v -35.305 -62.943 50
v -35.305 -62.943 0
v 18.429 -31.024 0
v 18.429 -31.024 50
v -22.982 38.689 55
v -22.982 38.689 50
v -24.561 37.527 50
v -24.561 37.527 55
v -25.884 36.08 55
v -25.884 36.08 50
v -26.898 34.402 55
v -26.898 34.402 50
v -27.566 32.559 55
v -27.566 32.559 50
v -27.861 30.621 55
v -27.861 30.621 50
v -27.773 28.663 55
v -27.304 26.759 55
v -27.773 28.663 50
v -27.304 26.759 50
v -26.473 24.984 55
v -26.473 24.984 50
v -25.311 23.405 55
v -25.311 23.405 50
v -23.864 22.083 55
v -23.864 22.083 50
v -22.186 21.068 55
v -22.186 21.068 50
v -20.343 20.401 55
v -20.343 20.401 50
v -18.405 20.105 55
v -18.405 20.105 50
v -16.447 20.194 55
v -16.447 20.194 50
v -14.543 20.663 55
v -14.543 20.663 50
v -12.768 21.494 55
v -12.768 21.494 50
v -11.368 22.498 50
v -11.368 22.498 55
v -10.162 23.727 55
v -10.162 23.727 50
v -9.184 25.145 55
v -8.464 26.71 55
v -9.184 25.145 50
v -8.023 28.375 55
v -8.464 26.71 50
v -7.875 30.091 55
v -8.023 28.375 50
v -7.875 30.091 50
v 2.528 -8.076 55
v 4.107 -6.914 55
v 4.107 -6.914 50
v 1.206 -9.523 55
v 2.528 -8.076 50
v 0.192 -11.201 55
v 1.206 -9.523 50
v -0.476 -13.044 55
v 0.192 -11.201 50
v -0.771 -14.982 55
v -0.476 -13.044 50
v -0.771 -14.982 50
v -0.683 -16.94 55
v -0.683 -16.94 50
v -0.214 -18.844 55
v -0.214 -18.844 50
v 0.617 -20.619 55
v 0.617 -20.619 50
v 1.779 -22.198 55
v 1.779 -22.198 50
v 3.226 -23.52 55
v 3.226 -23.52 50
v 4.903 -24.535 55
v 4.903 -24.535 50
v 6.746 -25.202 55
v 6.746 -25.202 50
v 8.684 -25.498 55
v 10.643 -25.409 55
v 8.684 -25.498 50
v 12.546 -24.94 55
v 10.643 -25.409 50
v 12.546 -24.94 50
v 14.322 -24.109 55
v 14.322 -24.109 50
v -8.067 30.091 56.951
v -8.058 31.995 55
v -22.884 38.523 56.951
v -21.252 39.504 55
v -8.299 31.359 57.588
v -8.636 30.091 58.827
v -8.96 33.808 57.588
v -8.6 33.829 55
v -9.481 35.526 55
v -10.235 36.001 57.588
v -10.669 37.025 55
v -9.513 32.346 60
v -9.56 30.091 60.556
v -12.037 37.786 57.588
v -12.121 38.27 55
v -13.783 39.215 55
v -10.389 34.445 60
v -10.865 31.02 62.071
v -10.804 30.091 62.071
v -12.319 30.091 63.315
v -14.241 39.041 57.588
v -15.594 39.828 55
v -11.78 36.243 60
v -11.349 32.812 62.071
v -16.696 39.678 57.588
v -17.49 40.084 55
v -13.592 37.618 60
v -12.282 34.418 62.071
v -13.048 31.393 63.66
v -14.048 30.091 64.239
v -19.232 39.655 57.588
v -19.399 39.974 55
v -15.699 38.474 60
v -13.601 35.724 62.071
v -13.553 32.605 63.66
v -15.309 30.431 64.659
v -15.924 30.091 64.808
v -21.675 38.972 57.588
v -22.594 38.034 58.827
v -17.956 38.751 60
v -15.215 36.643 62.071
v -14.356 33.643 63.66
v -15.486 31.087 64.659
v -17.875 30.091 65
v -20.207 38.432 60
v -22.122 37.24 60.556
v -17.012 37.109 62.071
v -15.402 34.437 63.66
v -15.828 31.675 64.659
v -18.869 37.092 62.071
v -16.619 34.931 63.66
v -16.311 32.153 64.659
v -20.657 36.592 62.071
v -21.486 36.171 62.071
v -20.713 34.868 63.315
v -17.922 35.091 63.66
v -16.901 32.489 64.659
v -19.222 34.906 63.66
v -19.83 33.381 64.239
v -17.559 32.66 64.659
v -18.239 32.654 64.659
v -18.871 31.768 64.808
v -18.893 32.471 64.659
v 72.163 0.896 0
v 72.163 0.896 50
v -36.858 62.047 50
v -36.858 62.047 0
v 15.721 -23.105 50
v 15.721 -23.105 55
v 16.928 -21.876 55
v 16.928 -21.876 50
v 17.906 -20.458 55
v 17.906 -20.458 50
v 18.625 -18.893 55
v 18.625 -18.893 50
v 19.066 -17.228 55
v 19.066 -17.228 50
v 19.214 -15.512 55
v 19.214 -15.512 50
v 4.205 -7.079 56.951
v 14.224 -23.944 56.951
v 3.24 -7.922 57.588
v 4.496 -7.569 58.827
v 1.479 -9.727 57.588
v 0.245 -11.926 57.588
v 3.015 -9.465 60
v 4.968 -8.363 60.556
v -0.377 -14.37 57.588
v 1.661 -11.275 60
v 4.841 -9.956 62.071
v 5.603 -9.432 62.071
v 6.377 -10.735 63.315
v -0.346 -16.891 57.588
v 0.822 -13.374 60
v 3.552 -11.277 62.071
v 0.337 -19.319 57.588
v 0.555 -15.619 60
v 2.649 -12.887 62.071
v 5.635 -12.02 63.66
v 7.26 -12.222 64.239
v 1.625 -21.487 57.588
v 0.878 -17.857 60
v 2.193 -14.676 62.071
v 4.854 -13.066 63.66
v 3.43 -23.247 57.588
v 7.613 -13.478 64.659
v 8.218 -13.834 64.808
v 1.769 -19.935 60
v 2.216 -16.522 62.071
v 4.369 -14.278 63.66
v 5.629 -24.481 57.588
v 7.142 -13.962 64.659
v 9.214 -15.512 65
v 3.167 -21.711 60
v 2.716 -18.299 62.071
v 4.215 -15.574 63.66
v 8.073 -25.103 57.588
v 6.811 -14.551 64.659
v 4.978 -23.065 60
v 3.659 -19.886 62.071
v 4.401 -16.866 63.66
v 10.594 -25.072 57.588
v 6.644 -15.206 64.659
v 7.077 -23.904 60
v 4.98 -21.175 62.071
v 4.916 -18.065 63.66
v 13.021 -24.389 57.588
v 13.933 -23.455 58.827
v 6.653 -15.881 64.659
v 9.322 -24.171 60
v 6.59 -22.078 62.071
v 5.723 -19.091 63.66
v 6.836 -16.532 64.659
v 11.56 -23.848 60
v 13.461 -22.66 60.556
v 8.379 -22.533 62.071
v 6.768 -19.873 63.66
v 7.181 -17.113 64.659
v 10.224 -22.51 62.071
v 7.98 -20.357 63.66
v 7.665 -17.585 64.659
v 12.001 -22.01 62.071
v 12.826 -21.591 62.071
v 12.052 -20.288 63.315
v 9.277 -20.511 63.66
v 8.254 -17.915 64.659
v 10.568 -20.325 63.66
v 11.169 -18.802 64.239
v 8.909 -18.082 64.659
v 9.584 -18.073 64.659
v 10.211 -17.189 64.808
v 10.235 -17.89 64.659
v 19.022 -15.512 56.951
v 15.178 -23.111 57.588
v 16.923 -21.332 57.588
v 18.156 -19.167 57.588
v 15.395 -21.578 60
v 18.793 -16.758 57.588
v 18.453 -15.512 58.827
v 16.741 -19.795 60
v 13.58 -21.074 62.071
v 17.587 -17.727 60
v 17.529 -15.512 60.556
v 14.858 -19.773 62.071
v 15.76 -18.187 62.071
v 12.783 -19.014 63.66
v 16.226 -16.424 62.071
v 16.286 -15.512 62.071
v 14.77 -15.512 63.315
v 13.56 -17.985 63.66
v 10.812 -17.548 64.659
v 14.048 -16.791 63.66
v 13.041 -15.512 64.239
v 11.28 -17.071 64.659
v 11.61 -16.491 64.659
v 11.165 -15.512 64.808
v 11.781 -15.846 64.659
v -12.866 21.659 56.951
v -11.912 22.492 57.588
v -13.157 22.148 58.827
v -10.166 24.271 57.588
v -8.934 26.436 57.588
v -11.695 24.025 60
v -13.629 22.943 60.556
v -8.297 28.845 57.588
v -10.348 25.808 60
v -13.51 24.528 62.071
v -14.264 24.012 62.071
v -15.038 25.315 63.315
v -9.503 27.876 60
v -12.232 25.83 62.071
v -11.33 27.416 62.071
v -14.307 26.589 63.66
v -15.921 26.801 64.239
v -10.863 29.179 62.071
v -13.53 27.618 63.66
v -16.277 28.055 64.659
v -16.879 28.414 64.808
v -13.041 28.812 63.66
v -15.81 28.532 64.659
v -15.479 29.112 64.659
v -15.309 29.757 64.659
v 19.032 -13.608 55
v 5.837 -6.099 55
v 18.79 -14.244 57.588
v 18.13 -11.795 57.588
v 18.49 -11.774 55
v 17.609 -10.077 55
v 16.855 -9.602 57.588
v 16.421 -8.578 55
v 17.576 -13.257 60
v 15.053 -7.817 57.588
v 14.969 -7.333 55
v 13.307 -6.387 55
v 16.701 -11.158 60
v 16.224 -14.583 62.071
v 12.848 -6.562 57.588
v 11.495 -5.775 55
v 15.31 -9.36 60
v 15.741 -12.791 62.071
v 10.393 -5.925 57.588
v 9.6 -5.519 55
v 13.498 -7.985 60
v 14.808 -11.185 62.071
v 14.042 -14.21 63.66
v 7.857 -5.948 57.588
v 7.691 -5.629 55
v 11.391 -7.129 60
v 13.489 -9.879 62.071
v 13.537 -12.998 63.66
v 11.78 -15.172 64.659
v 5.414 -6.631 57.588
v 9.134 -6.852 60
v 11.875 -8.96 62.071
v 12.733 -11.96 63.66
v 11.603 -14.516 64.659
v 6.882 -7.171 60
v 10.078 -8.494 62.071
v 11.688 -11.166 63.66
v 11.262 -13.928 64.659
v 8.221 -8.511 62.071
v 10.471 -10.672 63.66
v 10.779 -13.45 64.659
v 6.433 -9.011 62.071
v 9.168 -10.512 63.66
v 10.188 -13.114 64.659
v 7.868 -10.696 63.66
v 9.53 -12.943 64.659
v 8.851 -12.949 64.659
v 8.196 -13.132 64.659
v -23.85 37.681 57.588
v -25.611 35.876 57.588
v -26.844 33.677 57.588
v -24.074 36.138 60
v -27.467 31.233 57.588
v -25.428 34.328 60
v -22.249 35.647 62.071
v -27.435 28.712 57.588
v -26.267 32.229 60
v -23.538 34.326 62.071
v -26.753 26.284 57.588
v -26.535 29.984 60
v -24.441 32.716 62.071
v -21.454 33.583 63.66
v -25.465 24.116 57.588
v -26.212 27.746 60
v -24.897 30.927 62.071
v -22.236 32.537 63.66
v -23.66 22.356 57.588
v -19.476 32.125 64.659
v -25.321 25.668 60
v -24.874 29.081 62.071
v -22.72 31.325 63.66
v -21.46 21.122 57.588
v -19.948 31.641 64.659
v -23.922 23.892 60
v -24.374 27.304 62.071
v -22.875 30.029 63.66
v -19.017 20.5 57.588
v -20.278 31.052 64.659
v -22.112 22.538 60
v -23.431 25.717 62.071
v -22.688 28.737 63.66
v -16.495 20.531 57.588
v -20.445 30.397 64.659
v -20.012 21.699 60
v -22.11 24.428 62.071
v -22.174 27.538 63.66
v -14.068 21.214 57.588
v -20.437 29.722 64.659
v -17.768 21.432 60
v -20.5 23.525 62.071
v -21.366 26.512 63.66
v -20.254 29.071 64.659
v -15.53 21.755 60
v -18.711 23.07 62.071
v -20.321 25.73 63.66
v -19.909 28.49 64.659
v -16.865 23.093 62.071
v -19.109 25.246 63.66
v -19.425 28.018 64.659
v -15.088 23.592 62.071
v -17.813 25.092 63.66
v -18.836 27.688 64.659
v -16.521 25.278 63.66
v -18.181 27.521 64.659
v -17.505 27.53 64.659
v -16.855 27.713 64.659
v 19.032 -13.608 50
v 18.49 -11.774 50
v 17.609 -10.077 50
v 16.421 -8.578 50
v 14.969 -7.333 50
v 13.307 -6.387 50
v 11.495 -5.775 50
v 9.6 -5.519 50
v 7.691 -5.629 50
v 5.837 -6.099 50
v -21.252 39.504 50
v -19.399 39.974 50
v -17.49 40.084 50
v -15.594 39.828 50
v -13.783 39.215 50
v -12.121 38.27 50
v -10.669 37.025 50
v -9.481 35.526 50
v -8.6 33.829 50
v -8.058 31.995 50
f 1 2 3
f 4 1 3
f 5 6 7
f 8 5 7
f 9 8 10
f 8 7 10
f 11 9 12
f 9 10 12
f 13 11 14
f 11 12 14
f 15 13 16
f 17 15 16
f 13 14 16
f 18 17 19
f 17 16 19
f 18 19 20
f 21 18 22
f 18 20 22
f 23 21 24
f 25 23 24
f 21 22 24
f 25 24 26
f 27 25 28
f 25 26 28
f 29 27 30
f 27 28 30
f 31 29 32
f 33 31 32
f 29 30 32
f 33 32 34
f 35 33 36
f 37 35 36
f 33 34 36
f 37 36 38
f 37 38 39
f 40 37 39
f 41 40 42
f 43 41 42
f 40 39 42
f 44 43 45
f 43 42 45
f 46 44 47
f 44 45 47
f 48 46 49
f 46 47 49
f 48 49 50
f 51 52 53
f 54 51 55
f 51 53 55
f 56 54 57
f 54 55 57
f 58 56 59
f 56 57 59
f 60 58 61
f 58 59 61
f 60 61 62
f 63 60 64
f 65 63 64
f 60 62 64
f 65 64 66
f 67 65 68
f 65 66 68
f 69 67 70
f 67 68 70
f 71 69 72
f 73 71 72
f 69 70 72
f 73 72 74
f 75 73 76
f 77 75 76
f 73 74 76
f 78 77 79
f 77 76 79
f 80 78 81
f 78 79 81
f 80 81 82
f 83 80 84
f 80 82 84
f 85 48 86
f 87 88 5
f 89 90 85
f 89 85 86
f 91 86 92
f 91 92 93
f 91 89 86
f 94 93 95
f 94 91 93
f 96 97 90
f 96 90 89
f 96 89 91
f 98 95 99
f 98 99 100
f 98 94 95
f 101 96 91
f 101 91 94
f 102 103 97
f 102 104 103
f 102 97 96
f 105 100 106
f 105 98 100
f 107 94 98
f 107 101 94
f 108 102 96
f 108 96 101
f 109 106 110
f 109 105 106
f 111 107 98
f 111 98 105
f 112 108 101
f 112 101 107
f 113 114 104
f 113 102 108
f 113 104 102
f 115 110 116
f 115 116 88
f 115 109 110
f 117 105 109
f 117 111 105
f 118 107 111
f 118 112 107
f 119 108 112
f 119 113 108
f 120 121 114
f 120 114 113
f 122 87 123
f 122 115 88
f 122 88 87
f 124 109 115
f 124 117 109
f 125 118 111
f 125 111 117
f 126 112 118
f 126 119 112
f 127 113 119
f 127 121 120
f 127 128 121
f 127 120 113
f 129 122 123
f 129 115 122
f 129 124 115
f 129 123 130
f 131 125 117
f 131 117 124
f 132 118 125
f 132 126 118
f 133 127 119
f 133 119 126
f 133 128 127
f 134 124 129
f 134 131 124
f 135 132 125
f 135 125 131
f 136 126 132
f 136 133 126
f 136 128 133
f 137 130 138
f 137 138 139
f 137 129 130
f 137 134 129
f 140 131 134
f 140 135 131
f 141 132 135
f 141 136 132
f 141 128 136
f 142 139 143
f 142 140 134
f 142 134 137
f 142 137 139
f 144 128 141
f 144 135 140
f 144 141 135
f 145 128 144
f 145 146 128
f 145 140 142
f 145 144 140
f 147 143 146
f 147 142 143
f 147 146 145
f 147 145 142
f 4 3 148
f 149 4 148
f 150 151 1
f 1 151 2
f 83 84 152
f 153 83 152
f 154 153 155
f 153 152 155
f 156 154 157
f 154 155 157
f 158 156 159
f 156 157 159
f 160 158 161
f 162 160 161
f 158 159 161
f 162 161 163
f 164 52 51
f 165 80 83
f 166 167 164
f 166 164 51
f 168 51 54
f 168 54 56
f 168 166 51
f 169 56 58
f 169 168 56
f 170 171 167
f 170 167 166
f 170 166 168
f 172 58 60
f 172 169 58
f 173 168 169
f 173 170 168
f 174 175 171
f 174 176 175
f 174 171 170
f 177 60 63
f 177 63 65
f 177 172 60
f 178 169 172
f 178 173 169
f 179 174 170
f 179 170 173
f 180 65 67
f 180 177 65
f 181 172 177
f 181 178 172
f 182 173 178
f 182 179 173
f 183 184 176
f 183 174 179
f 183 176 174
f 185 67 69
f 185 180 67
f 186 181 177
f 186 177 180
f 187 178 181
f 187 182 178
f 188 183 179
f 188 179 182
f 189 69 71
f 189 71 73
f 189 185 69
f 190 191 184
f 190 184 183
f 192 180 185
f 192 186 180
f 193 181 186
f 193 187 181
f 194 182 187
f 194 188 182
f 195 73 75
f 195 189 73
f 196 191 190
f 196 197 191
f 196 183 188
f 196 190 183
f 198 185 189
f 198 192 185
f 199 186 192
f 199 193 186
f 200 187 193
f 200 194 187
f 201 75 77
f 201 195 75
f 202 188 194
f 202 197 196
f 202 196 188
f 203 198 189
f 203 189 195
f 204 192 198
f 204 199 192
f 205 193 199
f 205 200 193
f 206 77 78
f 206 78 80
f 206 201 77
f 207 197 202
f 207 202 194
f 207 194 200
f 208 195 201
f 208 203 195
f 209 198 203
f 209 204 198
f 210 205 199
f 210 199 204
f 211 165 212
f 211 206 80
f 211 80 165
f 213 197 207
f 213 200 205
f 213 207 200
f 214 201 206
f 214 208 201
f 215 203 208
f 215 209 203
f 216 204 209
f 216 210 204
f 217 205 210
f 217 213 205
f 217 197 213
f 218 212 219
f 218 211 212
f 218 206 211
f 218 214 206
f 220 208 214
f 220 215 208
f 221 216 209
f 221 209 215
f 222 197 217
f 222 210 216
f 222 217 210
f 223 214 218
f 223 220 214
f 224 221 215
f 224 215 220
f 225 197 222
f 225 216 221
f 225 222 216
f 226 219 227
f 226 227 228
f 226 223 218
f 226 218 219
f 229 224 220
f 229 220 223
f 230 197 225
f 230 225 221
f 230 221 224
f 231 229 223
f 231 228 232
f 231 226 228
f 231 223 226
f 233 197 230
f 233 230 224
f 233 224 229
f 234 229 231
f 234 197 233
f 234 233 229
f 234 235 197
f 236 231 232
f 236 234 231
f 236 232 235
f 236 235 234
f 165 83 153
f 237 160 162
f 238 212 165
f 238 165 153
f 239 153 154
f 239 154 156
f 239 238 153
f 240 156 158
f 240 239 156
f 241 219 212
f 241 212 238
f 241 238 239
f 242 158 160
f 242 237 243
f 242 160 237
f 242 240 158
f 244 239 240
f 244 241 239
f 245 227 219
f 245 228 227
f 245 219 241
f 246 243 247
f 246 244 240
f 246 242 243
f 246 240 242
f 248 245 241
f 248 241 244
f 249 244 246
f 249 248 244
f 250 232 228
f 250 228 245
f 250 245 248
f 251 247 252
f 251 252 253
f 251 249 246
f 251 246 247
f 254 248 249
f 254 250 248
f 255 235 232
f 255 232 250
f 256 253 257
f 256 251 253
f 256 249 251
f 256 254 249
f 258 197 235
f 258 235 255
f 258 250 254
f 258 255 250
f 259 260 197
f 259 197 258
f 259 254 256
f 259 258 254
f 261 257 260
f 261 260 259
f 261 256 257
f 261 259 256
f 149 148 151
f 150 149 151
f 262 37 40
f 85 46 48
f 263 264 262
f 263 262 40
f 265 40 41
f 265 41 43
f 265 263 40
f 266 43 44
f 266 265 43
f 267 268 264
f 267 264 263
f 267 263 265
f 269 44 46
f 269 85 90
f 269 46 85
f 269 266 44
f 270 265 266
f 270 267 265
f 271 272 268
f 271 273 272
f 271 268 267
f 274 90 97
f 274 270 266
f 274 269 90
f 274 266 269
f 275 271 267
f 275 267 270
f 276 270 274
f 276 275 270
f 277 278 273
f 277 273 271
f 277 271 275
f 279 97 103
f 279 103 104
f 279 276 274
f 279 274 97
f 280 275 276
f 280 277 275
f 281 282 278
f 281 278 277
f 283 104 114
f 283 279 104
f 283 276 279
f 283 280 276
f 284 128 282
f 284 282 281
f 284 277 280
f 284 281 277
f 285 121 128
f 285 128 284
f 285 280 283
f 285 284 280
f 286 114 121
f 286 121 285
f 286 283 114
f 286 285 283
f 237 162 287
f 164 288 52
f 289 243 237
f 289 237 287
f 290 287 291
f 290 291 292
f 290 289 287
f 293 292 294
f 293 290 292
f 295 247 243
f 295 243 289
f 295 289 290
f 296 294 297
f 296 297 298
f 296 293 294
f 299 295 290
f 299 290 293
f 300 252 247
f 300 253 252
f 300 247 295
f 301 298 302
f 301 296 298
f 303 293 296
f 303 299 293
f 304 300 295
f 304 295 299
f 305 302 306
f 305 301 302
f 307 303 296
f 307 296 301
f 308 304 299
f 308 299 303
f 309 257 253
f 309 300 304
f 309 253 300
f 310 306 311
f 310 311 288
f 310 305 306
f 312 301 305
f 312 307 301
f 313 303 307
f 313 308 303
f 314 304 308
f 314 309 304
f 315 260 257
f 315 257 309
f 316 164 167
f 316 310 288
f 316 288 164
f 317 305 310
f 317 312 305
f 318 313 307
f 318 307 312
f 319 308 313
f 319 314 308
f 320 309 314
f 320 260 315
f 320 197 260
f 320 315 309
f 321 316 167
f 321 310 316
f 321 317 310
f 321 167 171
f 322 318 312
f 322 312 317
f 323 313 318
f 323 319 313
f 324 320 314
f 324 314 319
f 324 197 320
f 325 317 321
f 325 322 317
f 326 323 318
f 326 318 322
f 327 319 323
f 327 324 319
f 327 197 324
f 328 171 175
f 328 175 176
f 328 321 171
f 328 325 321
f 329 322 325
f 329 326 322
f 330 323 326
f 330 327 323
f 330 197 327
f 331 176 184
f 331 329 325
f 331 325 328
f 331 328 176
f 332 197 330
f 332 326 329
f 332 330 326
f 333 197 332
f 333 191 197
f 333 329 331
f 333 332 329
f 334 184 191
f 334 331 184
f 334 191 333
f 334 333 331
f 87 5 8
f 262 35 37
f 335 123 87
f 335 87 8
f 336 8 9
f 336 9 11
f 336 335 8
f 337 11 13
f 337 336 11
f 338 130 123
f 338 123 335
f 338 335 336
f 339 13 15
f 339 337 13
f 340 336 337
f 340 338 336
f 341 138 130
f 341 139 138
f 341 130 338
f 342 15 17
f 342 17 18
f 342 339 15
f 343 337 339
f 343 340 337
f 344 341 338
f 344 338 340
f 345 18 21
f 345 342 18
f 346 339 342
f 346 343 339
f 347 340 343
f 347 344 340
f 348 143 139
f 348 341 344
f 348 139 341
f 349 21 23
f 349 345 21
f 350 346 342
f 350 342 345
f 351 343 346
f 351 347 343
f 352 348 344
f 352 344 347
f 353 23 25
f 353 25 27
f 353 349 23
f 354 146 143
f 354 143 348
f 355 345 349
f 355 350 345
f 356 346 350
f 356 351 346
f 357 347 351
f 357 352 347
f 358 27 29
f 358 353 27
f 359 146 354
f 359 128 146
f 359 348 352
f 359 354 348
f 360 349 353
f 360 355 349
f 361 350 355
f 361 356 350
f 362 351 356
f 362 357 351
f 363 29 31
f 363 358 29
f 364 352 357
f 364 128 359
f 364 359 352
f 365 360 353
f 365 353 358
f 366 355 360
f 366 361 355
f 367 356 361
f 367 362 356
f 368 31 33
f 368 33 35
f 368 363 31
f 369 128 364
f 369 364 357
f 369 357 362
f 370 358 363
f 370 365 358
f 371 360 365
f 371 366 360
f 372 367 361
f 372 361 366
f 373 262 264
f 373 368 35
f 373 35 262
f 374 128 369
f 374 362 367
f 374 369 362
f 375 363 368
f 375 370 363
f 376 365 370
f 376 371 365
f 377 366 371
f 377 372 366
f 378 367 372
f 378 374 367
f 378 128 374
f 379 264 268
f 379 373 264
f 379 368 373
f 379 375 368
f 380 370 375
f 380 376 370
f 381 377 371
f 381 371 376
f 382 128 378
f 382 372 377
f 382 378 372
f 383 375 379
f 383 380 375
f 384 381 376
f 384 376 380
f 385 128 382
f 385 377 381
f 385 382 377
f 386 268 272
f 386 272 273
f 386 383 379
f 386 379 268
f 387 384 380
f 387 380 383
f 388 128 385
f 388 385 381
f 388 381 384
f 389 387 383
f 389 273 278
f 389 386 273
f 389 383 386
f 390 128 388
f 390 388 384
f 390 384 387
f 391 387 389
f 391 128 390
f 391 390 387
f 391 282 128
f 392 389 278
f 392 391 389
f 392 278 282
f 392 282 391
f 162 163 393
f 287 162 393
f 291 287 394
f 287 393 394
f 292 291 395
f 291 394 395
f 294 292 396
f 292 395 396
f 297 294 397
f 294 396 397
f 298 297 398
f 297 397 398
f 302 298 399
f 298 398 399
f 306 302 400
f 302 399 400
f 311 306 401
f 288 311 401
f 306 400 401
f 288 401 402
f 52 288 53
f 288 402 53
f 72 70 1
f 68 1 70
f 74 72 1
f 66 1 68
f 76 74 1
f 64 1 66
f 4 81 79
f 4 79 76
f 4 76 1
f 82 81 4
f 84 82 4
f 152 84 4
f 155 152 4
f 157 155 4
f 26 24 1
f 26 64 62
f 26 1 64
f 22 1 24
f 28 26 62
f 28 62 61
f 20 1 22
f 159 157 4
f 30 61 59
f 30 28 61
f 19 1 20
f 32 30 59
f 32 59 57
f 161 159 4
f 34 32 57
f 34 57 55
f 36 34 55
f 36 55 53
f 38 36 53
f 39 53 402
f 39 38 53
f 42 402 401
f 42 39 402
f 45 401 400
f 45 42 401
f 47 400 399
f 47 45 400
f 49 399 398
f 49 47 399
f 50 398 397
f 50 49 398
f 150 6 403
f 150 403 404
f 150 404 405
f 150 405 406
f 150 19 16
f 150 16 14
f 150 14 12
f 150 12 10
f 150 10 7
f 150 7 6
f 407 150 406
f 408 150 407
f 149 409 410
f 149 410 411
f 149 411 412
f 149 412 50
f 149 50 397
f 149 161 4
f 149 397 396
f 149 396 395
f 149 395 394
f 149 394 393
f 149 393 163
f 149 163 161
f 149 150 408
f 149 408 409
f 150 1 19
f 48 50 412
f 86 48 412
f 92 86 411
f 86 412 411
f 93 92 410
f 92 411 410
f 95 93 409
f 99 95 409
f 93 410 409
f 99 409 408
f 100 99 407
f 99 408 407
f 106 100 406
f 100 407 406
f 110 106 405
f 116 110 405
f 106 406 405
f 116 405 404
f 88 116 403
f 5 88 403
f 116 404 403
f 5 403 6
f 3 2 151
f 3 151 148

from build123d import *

# Parameters (mm, degrees)
F1_DEPTH = 50
F2_DEPTH = 65
F3_R     = 10


with BuildPart() as f1:
    # F0 (on Top) → F1 (new body)
    with BuildSketch(Plane.XY):
        with BuildLine():
            Line((18.428938438, -31.0235001472), (72.1632169215, 0.8963575571))
            Line((72.1632169215, 0.8963575571), (-36.8578768761, 62.0470002943))
            Line((-36.8578768761, 62.0470002943), (-22.982297547, 38.6886805081))
            ThreePointArc((-22.982297547, 38.6886805081), (-12.9289992244, 38.7823343206), (-7.8751203144, 30.0911959508))
            ThreePointArc((-7.8751203144, 30.0911959508), (-9.1839819445, 25.1450748608), (-12.7679430817, 21.4937113934))
            Line((-12.7679430817, 21.4937113934), (0, 0))
            Line((0, 0), (4.1072919863, -6.9142655162))
            ThreePointArc((4.1072919863, -6.9142655162), (14.160590309, -6.8206117038), (19.214469219, -15.5117500736))
            ThreePointArc((19.214469219, -15.5117500736), (17.9056075888, -20.4578711635), (14.3216464517, -24.1092346309))
            Line((14.3216464517, -24.1092346309), (18.428938438, -31.0235001472))
        make_face()
        with BuildLine():
            Line((-35.3053400455, -62.9433578514), (18.428938438, -31.0235001472))
            Line((18.428938438, -31.0235001472), (14.3216464517, -24.1092346309))
            ThreePointArc((14.3216464517, -24.1092346309), (0.6169846617, -20.6189273063), (4.1072919863, -6.9142655162))
            Line((4.1072919863, -6.9142655162), (0, 0))
            Line((0, 0), (-12.7679430817, 21.4937113934))
            ThreePointArc((-12.7679430817, 21.4937113934), (-26.4726048717, 24.9840187181), (-22.982297547, 38.6886805081))
            Line((-22.982297547, 38.6886805081), (-36.8578768761, 62.0470002943))
            Line((-36.8578768761, 62.0470002943), (-35.3053400455, -62.9433578514))
        make_face()
    extrude(amount=F1_DEPTH)

    # F0 (on Top) → F2 (join)
    with BuildSketch(Plane.XY):
        with BuildLine():
            ThreePointArc((-7.8751203144, 30.0911959508), (-12.9289992244, 38.7823343206), (-22.982297547, 38.6886805081))
            Line((-22.982297547, 38.6886805081), (-12.7679430817, 21.4937113934))
            ThreePointArc((-12.7679430817, 21.4937113934), (-9.1839819445, 25.1450748608), (-7.8751203144, 30.0911959508))
        make_face()
        with BuildLine():
            Line((-12.7679430817, 21.4937113934), (-22.982297547, 38.6886805081))
            ThreePointArc((-22.982297547, 38.6886805081), (-26.4726048717, 24.9840187181), (-12.7679430817, 21.4937113934))
        make_face()
        with BuildLine():
            ThreePointArc((4.1072919863, -6.9142655162), (0.6169846617, -20.6189273063), (14.3216464517, -24.1092346309))
            Line((14.3216464517, -24.1092346309), (4.1072919863, -6.9142655162))
        make_face()
        with BuildLine():
            Line((4.1072919863, -6.9142655162), (14.3216464517, -24.1092346309))
            ThreePointArc((14.3216464517, -24.1092346309), (17.9056075888, -20.4578711635), (19.214469219, -15.5117500736))
            ThreePointArc((19.214469219, -15.5117500736), (14.160590309, -6.8206117038), (4.1072919863, -6.9142655162))
        make_face()
    extrude(amount=F2_DEPTH)

    # F3
    f3_edges = [f1.edges().sort_by_distance(p)[0] for p in [
        (-27.87512, 30.091196, 65),
        (4.107292, -6.914266, 65),
    ]]
    fillet(f3_edges, radius=F3_R)


solid = f1.part
